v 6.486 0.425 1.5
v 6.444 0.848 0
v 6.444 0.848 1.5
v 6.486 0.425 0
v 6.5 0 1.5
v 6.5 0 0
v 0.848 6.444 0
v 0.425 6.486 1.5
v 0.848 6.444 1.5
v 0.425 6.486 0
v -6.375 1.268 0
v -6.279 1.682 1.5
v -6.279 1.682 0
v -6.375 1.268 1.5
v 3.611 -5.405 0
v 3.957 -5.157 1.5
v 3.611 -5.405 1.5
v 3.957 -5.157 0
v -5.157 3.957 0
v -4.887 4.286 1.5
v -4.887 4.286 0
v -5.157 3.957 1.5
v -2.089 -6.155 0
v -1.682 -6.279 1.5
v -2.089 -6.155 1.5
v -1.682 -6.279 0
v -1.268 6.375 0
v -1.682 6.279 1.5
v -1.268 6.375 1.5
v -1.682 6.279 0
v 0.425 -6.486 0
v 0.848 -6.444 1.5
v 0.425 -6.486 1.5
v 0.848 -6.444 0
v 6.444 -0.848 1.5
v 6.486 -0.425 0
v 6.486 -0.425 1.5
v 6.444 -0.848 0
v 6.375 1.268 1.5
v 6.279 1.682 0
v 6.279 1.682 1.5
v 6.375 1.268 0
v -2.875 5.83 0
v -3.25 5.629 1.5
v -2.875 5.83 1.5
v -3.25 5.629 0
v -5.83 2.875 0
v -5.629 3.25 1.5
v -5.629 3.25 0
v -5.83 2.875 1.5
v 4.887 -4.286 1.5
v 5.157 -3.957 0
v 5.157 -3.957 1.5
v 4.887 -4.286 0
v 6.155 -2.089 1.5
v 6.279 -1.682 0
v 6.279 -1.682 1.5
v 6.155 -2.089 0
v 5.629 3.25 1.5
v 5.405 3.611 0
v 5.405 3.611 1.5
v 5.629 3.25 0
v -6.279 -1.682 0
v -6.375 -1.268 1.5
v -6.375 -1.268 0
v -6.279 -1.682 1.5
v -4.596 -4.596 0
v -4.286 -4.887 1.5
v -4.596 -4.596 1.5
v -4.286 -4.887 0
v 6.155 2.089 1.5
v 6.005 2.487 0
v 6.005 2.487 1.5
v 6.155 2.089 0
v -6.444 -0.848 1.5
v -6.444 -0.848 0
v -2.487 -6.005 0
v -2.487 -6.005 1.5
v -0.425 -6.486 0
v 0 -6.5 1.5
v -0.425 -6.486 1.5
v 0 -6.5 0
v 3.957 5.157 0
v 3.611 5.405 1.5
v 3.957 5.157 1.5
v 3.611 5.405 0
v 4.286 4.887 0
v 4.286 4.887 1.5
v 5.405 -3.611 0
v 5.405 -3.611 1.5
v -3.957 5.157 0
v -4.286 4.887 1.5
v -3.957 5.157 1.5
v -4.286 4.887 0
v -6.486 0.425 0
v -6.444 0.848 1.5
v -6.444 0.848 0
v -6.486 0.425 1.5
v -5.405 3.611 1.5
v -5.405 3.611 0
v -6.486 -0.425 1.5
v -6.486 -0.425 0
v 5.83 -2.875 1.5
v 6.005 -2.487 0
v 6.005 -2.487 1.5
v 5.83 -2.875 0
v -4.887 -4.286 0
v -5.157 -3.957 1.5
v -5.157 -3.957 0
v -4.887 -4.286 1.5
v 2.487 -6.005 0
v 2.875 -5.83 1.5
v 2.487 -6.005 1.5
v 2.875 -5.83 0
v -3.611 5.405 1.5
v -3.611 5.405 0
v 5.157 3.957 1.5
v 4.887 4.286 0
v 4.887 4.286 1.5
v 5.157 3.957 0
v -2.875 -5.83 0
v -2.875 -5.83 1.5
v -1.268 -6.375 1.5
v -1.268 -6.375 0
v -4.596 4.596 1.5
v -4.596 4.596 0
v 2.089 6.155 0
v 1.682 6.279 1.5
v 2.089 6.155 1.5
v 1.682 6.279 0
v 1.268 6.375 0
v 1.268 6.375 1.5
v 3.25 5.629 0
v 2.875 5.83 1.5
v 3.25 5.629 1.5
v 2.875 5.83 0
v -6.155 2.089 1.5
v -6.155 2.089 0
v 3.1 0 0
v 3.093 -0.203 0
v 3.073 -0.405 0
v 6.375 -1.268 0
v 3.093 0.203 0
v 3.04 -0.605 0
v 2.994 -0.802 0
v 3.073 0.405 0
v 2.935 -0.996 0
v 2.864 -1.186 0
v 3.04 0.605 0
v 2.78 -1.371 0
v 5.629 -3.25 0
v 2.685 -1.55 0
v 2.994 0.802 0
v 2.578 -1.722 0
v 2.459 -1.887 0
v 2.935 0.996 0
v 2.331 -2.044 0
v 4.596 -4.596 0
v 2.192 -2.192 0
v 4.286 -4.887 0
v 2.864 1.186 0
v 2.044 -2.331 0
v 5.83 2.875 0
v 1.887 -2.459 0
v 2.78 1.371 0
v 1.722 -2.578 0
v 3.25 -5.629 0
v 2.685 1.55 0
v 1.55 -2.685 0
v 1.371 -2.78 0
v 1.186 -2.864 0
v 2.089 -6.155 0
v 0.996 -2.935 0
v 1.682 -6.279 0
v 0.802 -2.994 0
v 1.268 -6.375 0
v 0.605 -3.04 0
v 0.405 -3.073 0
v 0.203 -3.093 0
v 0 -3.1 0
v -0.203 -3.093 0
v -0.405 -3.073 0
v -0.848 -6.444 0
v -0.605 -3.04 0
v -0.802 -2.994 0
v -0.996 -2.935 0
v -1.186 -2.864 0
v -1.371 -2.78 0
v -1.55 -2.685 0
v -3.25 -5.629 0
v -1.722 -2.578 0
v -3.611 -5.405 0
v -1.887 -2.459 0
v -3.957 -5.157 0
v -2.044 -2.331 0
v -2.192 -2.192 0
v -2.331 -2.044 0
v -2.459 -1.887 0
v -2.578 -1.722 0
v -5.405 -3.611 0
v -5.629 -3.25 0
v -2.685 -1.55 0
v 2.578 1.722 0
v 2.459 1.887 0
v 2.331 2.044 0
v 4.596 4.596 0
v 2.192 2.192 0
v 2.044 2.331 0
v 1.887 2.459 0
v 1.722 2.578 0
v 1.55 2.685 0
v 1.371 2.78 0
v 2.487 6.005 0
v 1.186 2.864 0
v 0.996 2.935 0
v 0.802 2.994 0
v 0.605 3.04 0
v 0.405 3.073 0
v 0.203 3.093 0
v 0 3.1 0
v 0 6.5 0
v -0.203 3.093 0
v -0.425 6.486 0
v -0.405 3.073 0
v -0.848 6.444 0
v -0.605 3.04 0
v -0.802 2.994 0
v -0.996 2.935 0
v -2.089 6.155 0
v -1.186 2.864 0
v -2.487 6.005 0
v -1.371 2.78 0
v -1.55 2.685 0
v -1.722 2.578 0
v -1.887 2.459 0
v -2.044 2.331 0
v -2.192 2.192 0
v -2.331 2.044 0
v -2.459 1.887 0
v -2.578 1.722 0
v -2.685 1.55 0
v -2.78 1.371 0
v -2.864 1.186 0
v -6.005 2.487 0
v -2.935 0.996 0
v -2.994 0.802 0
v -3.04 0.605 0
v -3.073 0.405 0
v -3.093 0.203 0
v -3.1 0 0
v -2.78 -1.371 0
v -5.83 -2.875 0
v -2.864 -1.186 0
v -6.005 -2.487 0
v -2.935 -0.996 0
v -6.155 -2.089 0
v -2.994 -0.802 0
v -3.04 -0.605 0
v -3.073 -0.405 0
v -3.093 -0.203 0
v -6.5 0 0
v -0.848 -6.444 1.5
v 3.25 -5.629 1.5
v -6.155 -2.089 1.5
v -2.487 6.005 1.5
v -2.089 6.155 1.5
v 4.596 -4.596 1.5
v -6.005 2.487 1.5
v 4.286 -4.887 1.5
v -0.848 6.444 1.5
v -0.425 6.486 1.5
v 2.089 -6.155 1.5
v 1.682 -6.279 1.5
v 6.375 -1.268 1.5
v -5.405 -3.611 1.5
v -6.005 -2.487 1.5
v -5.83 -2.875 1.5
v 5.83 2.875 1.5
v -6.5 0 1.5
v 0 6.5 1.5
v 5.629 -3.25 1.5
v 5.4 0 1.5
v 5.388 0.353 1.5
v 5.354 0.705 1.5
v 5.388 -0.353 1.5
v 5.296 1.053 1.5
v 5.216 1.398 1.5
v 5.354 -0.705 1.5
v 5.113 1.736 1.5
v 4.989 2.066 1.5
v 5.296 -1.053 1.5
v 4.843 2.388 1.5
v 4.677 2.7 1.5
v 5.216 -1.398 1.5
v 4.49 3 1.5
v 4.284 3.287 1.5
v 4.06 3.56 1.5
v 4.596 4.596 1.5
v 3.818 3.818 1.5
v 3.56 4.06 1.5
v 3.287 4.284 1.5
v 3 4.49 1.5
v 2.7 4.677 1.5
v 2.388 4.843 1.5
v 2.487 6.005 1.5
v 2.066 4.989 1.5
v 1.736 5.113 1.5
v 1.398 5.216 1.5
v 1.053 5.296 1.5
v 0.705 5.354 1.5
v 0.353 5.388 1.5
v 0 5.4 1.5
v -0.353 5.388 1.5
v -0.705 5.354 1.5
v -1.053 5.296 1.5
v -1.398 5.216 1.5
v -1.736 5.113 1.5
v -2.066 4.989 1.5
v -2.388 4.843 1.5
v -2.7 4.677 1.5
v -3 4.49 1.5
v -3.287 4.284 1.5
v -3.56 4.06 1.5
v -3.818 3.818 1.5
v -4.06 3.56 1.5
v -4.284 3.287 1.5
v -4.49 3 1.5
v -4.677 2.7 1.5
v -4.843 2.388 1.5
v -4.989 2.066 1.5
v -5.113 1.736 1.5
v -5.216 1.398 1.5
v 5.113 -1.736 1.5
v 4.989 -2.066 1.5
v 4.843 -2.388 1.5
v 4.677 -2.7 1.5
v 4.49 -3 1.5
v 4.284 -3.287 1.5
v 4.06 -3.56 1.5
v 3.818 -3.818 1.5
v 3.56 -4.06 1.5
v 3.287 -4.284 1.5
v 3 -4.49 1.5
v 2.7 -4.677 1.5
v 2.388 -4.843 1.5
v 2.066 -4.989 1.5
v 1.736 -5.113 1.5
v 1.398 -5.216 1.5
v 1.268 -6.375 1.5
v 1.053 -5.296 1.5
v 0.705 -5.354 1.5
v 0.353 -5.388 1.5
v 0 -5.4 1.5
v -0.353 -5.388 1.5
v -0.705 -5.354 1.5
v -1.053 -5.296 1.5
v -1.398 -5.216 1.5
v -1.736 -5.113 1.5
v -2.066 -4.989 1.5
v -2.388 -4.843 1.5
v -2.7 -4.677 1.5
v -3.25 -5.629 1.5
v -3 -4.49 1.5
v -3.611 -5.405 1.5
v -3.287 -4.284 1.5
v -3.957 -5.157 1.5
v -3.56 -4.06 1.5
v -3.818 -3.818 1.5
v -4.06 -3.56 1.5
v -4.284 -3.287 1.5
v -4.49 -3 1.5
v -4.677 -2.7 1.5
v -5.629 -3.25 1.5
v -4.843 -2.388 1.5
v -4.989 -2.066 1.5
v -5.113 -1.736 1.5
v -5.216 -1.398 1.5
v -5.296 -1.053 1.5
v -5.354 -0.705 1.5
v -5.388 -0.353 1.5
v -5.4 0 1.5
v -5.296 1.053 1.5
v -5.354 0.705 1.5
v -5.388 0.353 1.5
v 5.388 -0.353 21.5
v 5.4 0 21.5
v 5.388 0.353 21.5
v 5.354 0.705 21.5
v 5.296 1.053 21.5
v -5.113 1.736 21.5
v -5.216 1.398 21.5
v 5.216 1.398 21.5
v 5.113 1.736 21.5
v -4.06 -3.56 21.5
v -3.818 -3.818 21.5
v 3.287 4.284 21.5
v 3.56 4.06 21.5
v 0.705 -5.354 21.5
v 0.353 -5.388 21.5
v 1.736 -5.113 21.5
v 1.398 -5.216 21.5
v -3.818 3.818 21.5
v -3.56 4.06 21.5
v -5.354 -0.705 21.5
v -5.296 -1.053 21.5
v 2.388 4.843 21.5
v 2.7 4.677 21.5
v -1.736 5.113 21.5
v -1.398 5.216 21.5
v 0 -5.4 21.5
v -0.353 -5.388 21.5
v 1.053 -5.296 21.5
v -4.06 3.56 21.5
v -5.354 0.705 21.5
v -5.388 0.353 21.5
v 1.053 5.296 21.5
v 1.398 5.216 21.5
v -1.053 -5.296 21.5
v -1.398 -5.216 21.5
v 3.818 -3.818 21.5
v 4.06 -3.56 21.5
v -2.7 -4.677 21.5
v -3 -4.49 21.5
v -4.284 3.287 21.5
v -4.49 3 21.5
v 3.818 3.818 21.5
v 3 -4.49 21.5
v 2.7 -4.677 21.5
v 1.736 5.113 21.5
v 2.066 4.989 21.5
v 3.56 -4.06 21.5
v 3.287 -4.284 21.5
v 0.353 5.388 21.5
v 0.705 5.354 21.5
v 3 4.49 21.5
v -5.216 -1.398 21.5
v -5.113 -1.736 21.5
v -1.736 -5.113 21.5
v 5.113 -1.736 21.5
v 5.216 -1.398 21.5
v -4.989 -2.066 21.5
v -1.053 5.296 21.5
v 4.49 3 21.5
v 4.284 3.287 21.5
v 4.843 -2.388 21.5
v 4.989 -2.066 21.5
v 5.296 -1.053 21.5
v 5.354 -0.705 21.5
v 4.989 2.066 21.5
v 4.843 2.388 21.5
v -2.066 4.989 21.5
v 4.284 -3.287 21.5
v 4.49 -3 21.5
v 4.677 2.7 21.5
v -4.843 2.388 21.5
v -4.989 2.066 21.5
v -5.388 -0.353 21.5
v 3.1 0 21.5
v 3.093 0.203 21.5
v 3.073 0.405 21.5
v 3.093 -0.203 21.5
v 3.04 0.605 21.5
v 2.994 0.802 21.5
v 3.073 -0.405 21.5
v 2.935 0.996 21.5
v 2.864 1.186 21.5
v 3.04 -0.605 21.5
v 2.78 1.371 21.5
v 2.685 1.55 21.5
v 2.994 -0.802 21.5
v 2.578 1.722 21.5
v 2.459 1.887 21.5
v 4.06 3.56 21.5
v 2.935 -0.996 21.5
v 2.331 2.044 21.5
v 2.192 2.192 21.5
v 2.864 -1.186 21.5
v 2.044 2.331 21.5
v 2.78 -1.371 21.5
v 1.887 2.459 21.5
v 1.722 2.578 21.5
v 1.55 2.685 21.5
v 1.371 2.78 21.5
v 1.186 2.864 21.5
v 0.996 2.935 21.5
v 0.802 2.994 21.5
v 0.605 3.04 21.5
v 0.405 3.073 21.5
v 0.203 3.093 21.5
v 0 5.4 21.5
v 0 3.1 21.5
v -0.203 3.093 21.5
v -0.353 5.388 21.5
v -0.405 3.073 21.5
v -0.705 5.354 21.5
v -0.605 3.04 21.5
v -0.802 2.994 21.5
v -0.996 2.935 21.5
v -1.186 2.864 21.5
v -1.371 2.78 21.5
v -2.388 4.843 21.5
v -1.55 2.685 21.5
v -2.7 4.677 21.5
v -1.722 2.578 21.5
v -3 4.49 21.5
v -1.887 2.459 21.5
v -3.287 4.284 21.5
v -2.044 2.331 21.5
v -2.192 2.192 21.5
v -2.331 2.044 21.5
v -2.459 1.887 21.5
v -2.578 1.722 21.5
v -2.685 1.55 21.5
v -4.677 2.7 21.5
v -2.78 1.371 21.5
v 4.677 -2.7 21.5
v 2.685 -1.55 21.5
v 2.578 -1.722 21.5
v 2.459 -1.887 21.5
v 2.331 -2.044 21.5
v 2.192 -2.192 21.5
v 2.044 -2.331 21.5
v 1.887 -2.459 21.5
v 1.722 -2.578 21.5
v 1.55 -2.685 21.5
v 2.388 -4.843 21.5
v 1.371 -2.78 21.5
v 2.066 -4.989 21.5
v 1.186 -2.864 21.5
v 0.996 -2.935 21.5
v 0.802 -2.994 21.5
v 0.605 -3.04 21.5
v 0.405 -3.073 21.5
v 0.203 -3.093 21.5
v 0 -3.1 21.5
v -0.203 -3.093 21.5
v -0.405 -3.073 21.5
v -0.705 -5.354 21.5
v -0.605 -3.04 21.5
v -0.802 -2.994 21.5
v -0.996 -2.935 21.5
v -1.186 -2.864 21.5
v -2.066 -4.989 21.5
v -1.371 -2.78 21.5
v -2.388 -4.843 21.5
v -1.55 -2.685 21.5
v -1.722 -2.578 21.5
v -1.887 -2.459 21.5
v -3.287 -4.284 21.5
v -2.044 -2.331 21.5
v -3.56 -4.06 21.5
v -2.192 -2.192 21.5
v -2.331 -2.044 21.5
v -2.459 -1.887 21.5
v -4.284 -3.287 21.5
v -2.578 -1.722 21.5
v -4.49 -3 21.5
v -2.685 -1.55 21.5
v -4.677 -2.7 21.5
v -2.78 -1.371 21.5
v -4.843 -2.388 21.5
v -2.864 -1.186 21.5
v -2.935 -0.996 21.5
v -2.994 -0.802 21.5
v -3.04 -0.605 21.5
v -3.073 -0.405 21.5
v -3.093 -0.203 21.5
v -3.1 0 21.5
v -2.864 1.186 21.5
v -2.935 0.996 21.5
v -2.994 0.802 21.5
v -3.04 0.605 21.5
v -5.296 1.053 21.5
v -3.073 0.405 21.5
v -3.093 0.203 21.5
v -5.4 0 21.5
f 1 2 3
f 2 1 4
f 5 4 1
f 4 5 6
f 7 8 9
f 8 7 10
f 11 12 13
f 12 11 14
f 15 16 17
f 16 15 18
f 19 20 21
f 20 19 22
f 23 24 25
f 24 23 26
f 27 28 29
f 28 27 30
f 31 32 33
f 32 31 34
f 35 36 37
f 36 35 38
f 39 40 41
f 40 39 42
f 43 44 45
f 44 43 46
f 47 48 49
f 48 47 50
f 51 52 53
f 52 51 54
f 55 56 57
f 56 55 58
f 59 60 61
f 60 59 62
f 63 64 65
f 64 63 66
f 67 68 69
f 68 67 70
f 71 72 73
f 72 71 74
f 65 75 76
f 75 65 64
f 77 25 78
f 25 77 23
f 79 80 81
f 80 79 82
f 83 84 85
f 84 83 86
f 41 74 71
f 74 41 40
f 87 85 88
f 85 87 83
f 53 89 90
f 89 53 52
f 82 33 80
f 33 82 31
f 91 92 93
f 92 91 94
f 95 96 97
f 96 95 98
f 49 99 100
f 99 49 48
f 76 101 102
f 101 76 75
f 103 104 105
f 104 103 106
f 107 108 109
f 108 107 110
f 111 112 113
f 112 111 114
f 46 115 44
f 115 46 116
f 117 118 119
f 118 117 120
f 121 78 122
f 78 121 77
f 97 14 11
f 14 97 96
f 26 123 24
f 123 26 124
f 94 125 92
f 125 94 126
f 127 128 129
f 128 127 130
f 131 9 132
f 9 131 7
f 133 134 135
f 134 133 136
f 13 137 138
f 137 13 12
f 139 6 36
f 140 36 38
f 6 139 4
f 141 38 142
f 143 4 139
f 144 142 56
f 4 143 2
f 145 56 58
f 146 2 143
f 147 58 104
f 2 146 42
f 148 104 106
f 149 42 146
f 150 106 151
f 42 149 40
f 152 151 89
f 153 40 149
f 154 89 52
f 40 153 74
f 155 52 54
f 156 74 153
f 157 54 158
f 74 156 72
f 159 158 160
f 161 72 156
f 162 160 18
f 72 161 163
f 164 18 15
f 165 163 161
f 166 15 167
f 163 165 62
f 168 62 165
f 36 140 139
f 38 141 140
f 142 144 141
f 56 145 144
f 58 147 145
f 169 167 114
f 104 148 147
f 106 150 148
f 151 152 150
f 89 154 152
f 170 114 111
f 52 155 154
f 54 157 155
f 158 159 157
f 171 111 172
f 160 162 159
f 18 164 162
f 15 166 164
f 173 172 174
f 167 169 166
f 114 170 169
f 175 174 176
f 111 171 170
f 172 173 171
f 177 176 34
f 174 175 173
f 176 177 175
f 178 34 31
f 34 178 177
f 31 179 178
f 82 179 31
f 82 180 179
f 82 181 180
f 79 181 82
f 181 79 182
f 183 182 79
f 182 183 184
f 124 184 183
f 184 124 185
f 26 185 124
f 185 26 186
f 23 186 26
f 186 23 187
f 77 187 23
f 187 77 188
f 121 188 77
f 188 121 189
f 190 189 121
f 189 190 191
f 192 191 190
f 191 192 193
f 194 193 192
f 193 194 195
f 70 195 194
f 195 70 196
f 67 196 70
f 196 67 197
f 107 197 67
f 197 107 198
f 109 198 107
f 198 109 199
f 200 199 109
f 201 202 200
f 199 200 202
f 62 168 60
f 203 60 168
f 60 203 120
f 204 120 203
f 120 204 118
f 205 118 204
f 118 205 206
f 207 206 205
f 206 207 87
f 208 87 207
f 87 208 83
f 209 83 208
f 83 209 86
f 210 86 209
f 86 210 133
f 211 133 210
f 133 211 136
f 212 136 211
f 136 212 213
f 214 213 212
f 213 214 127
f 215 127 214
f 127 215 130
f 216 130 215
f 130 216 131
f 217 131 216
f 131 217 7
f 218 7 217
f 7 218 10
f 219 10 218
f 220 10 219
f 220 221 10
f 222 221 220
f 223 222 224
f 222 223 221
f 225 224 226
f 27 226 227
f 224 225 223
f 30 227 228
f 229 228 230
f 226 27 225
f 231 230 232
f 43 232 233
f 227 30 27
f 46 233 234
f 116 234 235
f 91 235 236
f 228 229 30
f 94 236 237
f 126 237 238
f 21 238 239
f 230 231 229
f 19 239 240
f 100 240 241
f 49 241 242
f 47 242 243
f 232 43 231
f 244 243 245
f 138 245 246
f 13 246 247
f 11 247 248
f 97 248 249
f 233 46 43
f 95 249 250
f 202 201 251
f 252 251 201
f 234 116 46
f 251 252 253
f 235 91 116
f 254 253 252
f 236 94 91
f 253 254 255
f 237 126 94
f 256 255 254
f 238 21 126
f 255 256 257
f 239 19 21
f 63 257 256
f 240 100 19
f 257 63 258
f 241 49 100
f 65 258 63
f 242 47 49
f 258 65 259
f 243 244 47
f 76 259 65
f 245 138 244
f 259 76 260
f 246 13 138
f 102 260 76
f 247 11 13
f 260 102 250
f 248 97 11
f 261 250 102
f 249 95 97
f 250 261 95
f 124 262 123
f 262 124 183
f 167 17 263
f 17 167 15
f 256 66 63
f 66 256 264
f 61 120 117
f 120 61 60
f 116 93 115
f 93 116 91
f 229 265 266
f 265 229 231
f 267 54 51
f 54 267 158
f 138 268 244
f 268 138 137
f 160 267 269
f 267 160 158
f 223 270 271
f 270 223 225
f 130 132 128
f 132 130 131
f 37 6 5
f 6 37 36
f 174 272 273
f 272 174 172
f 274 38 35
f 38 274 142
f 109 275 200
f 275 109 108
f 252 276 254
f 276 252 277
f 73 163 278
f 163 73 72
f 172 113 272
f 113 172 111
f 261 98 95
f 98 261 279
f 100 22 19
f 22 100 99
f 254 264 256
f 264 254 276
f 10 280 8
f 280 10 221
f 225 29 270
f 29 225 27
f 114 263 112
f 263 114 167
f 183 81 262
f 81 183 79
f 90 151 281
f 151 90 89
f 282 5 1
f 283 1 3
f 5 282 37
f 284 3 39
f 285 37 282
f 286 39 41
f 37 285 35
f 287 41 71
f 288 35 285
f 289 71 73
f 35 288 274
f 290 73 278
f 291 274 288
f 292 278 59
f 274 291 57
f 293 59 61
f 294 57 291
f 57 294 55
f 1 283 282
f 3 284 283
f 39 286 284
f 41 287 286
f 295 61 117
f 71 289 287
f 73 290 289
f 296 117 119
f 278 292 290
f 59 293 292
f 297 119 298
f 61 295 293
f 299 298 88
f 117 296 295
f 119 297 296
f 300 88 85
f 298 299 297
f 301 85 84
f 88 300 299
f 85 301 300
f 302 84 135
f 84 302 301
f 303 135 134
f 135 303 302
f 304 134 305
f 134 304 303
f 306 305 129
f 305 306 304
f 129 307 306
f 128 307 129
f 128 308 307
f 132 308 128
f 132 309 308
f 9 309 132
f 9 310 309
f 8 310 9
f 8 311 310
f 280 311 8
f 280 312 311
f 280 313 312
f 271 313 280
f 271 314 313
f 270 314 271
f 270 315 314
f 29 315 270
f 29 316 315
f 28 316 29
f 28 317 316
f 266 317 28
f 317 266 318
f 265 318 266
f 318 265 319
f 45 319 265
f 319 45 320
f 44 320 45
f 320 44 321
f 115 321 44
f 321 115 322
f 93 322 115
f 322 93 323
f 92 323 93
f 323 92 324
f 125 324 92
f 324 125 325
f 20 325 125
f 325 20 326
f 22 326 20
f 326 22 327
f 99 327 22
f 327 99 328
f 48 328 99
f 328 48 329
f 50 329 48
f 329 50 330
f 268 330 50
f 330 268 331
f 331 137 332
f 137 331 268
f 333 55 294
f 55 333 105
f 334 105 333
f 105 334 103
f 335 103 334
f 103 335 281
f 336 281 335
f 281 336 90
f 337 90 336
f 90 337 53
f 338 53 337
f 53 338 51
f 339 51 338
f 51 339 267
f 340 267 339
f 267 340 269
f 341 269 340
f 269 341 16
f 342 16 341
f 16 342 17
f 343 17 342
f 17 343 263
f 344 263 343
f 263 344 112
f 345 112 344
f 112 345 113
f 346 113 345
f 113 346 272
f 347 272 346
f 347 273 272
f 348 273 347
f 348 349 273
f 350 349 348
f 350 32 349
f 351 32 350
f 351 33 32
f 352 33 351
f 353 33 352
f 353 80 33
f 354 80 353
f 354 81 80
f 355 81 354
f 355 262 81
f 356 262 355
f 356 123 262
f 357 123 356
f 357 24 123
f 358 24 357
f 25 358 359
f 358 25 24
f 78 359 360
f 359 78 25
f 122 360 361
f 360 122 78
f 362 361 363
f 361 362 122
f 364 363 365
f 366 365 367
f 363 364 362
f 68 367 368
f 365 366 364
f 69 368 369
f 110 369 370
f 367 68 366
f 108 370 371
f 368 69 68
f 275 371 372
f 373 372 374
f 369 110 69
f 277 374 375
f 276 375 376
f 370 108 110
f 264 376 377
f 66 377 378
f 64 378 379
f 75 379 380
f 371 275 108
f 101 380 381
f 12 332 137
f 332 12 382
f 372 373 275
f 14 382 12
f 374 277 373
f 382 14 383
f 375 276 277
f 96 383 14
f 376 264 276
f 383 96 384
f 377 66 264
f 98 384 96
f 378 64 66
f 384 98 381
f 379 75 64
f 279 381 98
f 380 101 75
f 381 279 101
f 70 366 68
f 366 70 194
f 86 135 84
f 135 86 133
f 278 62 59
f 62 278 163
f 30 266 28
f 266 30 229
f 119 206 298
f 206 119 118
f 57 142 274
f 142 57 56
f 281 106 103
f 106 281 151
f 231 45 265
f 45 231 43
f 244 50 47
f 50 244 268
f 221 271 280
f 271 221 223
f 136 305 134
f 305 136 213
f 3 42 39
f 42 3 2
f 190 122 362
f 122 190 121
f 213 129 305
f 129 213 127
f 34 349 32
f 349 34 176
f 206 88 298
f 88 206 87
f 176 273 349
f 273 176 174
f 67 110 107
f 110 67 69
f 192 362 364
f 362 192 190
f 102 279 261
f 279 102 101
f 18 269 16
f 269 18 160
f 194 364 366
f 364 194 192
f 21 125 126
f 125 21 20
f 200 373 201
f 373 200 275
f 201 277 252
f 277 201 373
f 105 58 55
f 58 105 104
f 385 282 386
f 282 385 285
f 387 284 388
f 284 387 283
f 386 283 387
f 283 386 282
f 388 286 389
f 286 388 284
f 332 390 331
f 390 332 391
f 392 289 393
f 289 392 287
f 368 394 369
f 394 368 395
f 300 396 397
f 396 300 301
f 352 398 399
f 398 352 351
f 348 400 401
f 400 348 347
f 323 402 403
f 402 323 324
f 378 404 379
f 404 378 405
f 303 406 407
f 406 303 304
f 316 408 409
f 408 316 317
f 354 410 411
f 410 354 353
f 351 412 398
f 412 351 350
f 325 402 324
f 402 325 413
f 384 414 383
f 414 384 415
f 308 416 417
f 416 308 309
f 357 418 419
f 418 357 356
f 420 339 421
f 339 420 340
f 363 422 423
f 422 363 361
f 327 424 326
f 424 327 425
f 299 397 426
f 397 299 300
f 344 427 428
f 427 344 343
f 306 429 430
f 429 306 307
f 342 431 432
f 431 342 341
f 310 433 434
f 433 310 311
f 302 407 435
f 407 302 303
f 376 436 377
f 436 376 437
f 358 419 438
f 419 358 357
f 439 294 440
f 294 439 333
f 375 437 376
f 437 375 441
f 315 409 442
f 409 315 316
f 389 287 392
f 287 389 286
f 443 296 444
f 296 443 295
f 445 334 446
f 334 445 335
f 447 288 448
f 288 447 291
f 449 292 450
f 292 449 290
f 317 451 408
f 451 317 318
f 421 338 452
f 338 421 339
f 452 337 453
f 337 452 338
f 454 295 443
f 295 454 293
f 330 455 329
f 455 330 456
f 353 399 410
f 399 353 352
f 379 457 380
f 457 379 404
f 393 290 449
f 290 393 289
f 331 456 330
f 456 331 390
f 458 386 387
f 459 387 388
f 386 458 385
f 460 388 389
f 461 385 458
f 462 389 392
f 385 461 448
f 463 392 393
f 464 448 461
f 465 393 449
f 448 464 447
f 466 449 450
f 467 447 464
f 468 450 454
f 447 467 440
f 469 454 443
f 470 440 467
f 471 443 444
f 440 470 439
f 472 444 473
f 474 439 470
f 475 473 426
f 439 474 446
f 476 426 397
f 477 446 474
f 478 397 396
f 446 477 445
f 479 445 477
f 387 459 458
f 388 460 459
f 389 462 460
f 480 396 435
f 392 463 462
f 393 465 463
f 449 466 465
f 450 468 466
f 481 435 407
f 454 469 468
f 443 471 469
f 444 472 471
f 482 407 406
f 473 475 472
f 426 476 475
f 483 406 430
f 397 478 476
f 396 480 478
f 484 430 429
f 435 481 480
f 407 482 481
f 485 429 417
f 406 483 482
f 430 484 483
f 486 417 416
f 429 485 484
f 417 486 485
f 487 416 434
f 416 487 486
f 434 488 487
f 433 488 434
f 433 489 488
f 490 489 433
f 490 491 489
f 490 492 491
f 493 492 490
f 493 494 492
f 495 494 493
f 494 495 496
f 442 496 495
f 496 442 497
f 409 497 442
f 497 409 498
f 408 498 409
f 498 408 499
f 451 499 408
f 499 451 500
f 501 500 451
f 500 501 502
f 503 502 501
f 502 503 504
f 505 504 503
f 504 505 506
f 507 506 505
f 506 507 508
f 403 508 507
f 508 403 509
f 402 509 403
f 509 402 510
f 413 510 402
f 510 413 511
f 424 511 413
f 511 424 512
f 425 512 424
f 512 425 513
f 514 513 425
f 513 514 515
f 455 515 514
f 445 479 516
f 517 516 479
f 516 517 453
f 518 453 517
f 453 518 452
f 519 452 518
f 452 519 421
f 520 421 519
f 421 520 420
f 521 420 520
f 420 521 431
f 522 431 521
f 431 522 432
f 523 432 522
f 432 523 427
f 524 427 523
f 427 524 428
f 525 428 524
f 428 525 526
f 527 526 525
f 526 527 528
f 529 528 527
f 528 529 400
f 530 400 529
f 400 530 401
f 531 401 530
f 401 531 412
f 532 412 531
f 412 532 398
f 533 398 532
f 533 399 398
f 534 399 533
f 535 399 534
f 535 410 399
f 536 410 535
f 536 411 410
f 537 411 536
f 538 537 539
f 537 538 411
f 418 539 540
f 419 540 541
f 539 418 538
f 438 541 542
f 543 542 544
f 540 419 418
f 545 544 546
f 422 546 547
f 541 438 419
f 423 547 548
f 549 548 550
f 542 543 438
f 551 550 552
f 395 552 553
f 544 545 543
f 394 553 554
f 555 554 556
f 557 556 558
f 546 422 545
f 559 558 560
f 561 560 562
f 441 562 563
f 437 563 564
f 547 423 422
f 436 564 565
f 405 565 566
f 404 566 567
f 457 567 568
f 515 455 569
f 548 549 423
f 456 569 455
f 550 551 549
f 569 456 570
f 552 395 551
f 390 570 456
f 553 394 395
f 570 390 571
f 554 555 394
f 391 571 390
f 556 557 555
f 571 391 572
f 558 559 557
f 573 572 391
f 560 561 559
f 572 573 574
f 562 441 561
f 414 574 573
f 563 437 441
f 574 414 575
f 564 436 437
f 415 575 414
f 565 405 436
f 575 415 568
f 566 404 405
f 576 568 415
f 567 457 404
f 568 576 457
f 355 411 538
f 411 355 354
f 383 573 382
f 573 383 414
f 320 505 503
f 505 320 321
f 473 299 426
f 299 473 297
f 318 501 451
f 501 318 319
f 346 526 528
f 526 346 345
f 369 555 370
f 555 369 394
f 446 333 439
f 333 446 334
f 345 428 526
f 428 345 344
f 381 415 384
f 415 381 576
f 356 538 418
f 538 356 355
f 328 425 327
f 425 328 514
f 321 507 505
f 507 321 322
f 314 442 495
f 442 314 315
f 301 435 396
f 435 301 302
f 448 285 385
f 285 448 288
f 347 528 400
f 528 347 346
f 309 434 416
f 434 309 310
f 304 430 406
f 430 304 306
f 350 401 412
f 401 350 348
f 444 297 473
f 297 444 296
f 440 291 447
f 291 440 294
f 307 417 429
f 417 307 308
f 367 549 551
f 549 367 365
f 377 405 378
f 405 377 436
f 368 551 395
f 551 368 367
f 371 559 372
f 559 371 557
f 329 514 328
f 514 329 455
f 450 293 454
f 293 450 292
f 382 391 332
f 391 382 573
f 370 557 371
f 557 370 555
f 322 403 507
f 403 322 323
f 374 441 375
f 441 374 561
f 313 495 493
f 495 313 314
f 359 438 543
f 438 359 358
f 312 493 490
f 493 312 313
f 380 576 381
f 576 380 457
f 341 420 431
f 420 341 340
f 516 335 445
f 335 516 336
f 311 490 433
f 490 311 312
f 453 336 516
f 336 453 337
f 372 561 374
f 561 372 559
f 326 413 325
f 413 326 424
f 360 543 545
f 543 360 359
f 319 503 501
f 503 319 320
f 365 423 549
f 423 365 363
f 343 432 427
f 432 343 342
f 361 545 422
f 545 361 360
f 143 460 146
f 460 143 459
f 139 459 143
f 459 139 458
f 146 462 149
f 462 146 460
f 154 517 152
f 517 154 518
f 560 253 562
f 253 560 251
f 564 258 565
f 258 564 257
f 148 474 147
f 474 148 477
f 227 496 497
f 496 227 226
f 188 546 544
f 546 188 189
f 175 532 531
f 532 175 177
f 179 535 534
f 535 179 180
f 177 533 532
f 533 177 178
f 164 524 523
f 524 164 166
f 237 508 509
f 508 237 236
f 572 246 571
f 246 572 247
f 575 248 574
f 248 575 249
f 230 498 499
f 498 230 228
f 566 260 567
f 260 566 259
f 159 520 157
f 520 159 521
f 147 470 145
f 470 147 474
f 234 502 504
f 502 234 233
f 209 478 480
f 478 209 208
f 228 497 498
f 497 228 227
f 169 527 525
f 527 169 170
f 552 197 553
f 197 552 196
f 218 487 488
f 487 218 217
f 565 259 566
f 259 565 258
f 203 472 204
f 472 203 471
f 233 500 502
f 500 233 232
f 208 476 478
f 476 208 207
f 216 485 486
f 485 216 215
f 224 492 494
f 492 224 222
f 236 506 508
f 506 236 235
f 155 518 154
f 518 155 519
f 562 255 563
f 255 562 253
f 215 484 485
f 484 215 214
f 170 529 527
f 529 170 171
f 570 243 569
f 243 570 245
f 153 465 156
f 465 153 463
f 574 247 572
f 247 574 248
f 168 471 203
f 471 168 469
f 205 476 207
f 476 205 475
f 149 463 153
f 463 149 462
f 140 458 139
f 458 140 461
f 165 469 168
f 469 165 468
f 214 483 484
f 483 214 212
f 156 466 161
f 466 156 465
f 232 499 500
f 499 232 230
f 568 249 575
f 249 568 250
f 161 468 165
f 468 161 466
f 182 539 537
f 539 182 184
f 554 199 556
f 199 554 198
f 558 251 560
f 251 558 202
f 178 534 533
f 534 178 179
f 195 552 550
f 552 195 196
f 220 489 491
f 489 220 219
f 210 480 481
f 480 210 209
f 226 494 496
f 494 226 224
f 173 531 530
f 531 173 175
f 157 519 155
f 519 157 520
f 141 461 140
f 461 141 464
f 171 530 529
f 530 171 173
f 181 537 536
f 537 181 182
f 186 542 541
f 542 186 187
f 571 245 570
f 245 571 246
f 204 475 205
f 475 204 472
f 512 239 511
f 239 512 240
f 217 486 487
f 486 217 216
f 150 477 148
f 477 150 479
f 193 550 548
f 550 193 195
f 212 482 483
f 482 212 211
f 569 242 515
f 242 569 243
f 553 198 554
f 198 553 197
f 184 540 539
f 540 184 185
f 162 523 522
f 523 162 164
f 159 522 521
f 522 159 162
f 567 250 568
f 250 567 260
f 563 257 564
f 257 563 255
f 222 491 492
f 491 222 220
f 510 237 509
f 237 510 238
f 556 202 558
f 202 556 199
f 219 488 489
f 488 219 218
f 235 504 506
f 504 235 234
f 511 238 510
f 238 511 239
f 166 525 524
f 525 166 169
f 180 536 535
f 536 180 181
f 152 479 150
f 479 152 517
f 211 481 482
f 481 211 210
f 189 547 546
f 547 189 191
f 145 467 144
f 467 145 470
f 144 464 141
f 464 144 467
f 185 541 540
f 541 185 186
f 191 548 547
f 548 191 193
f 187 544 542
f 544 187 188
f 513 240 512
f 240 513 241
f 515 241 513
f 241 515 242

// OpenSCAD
// PCR tube adapter sleeve: 0.2 mL tube in a 1.5 mL rack hole
// Print orientation: collar on the bed (z = 0), sleeve body rises to z = 21.5

// ---- Dimensions (mm) ----
collar_d        = 13;    // collar outer diameter
collar_h        = 1.5;   // collar thickness (z = 0 to 1.5)
sleeve_od       = 10.8;  // sleeve body outer diameter
sleeve_top_z    = 21.5;  // top of sleeve body
bore_d          = 6.2;   // through-bore diameter
eps             = 0.5;   // cutter overshoot past faces

$fn = 96;

difference() {
    union() {
        // Collar
        cylinder(d = collar_d, h = collar_h);
        // Sleeve body (slightly overlapping the collar for a clean union)
        translate([0, 0, collar_h - 0.01])
            cylinder(d = sleeve_od, h = sleeve_top_z - collar_h + 0.01);
    }
    // Through-bore, open at both ends
    translate([0, 0, -eps])
        cylinder(d = bore_d, h = sleeve_top_z + 2 * eps);
}
